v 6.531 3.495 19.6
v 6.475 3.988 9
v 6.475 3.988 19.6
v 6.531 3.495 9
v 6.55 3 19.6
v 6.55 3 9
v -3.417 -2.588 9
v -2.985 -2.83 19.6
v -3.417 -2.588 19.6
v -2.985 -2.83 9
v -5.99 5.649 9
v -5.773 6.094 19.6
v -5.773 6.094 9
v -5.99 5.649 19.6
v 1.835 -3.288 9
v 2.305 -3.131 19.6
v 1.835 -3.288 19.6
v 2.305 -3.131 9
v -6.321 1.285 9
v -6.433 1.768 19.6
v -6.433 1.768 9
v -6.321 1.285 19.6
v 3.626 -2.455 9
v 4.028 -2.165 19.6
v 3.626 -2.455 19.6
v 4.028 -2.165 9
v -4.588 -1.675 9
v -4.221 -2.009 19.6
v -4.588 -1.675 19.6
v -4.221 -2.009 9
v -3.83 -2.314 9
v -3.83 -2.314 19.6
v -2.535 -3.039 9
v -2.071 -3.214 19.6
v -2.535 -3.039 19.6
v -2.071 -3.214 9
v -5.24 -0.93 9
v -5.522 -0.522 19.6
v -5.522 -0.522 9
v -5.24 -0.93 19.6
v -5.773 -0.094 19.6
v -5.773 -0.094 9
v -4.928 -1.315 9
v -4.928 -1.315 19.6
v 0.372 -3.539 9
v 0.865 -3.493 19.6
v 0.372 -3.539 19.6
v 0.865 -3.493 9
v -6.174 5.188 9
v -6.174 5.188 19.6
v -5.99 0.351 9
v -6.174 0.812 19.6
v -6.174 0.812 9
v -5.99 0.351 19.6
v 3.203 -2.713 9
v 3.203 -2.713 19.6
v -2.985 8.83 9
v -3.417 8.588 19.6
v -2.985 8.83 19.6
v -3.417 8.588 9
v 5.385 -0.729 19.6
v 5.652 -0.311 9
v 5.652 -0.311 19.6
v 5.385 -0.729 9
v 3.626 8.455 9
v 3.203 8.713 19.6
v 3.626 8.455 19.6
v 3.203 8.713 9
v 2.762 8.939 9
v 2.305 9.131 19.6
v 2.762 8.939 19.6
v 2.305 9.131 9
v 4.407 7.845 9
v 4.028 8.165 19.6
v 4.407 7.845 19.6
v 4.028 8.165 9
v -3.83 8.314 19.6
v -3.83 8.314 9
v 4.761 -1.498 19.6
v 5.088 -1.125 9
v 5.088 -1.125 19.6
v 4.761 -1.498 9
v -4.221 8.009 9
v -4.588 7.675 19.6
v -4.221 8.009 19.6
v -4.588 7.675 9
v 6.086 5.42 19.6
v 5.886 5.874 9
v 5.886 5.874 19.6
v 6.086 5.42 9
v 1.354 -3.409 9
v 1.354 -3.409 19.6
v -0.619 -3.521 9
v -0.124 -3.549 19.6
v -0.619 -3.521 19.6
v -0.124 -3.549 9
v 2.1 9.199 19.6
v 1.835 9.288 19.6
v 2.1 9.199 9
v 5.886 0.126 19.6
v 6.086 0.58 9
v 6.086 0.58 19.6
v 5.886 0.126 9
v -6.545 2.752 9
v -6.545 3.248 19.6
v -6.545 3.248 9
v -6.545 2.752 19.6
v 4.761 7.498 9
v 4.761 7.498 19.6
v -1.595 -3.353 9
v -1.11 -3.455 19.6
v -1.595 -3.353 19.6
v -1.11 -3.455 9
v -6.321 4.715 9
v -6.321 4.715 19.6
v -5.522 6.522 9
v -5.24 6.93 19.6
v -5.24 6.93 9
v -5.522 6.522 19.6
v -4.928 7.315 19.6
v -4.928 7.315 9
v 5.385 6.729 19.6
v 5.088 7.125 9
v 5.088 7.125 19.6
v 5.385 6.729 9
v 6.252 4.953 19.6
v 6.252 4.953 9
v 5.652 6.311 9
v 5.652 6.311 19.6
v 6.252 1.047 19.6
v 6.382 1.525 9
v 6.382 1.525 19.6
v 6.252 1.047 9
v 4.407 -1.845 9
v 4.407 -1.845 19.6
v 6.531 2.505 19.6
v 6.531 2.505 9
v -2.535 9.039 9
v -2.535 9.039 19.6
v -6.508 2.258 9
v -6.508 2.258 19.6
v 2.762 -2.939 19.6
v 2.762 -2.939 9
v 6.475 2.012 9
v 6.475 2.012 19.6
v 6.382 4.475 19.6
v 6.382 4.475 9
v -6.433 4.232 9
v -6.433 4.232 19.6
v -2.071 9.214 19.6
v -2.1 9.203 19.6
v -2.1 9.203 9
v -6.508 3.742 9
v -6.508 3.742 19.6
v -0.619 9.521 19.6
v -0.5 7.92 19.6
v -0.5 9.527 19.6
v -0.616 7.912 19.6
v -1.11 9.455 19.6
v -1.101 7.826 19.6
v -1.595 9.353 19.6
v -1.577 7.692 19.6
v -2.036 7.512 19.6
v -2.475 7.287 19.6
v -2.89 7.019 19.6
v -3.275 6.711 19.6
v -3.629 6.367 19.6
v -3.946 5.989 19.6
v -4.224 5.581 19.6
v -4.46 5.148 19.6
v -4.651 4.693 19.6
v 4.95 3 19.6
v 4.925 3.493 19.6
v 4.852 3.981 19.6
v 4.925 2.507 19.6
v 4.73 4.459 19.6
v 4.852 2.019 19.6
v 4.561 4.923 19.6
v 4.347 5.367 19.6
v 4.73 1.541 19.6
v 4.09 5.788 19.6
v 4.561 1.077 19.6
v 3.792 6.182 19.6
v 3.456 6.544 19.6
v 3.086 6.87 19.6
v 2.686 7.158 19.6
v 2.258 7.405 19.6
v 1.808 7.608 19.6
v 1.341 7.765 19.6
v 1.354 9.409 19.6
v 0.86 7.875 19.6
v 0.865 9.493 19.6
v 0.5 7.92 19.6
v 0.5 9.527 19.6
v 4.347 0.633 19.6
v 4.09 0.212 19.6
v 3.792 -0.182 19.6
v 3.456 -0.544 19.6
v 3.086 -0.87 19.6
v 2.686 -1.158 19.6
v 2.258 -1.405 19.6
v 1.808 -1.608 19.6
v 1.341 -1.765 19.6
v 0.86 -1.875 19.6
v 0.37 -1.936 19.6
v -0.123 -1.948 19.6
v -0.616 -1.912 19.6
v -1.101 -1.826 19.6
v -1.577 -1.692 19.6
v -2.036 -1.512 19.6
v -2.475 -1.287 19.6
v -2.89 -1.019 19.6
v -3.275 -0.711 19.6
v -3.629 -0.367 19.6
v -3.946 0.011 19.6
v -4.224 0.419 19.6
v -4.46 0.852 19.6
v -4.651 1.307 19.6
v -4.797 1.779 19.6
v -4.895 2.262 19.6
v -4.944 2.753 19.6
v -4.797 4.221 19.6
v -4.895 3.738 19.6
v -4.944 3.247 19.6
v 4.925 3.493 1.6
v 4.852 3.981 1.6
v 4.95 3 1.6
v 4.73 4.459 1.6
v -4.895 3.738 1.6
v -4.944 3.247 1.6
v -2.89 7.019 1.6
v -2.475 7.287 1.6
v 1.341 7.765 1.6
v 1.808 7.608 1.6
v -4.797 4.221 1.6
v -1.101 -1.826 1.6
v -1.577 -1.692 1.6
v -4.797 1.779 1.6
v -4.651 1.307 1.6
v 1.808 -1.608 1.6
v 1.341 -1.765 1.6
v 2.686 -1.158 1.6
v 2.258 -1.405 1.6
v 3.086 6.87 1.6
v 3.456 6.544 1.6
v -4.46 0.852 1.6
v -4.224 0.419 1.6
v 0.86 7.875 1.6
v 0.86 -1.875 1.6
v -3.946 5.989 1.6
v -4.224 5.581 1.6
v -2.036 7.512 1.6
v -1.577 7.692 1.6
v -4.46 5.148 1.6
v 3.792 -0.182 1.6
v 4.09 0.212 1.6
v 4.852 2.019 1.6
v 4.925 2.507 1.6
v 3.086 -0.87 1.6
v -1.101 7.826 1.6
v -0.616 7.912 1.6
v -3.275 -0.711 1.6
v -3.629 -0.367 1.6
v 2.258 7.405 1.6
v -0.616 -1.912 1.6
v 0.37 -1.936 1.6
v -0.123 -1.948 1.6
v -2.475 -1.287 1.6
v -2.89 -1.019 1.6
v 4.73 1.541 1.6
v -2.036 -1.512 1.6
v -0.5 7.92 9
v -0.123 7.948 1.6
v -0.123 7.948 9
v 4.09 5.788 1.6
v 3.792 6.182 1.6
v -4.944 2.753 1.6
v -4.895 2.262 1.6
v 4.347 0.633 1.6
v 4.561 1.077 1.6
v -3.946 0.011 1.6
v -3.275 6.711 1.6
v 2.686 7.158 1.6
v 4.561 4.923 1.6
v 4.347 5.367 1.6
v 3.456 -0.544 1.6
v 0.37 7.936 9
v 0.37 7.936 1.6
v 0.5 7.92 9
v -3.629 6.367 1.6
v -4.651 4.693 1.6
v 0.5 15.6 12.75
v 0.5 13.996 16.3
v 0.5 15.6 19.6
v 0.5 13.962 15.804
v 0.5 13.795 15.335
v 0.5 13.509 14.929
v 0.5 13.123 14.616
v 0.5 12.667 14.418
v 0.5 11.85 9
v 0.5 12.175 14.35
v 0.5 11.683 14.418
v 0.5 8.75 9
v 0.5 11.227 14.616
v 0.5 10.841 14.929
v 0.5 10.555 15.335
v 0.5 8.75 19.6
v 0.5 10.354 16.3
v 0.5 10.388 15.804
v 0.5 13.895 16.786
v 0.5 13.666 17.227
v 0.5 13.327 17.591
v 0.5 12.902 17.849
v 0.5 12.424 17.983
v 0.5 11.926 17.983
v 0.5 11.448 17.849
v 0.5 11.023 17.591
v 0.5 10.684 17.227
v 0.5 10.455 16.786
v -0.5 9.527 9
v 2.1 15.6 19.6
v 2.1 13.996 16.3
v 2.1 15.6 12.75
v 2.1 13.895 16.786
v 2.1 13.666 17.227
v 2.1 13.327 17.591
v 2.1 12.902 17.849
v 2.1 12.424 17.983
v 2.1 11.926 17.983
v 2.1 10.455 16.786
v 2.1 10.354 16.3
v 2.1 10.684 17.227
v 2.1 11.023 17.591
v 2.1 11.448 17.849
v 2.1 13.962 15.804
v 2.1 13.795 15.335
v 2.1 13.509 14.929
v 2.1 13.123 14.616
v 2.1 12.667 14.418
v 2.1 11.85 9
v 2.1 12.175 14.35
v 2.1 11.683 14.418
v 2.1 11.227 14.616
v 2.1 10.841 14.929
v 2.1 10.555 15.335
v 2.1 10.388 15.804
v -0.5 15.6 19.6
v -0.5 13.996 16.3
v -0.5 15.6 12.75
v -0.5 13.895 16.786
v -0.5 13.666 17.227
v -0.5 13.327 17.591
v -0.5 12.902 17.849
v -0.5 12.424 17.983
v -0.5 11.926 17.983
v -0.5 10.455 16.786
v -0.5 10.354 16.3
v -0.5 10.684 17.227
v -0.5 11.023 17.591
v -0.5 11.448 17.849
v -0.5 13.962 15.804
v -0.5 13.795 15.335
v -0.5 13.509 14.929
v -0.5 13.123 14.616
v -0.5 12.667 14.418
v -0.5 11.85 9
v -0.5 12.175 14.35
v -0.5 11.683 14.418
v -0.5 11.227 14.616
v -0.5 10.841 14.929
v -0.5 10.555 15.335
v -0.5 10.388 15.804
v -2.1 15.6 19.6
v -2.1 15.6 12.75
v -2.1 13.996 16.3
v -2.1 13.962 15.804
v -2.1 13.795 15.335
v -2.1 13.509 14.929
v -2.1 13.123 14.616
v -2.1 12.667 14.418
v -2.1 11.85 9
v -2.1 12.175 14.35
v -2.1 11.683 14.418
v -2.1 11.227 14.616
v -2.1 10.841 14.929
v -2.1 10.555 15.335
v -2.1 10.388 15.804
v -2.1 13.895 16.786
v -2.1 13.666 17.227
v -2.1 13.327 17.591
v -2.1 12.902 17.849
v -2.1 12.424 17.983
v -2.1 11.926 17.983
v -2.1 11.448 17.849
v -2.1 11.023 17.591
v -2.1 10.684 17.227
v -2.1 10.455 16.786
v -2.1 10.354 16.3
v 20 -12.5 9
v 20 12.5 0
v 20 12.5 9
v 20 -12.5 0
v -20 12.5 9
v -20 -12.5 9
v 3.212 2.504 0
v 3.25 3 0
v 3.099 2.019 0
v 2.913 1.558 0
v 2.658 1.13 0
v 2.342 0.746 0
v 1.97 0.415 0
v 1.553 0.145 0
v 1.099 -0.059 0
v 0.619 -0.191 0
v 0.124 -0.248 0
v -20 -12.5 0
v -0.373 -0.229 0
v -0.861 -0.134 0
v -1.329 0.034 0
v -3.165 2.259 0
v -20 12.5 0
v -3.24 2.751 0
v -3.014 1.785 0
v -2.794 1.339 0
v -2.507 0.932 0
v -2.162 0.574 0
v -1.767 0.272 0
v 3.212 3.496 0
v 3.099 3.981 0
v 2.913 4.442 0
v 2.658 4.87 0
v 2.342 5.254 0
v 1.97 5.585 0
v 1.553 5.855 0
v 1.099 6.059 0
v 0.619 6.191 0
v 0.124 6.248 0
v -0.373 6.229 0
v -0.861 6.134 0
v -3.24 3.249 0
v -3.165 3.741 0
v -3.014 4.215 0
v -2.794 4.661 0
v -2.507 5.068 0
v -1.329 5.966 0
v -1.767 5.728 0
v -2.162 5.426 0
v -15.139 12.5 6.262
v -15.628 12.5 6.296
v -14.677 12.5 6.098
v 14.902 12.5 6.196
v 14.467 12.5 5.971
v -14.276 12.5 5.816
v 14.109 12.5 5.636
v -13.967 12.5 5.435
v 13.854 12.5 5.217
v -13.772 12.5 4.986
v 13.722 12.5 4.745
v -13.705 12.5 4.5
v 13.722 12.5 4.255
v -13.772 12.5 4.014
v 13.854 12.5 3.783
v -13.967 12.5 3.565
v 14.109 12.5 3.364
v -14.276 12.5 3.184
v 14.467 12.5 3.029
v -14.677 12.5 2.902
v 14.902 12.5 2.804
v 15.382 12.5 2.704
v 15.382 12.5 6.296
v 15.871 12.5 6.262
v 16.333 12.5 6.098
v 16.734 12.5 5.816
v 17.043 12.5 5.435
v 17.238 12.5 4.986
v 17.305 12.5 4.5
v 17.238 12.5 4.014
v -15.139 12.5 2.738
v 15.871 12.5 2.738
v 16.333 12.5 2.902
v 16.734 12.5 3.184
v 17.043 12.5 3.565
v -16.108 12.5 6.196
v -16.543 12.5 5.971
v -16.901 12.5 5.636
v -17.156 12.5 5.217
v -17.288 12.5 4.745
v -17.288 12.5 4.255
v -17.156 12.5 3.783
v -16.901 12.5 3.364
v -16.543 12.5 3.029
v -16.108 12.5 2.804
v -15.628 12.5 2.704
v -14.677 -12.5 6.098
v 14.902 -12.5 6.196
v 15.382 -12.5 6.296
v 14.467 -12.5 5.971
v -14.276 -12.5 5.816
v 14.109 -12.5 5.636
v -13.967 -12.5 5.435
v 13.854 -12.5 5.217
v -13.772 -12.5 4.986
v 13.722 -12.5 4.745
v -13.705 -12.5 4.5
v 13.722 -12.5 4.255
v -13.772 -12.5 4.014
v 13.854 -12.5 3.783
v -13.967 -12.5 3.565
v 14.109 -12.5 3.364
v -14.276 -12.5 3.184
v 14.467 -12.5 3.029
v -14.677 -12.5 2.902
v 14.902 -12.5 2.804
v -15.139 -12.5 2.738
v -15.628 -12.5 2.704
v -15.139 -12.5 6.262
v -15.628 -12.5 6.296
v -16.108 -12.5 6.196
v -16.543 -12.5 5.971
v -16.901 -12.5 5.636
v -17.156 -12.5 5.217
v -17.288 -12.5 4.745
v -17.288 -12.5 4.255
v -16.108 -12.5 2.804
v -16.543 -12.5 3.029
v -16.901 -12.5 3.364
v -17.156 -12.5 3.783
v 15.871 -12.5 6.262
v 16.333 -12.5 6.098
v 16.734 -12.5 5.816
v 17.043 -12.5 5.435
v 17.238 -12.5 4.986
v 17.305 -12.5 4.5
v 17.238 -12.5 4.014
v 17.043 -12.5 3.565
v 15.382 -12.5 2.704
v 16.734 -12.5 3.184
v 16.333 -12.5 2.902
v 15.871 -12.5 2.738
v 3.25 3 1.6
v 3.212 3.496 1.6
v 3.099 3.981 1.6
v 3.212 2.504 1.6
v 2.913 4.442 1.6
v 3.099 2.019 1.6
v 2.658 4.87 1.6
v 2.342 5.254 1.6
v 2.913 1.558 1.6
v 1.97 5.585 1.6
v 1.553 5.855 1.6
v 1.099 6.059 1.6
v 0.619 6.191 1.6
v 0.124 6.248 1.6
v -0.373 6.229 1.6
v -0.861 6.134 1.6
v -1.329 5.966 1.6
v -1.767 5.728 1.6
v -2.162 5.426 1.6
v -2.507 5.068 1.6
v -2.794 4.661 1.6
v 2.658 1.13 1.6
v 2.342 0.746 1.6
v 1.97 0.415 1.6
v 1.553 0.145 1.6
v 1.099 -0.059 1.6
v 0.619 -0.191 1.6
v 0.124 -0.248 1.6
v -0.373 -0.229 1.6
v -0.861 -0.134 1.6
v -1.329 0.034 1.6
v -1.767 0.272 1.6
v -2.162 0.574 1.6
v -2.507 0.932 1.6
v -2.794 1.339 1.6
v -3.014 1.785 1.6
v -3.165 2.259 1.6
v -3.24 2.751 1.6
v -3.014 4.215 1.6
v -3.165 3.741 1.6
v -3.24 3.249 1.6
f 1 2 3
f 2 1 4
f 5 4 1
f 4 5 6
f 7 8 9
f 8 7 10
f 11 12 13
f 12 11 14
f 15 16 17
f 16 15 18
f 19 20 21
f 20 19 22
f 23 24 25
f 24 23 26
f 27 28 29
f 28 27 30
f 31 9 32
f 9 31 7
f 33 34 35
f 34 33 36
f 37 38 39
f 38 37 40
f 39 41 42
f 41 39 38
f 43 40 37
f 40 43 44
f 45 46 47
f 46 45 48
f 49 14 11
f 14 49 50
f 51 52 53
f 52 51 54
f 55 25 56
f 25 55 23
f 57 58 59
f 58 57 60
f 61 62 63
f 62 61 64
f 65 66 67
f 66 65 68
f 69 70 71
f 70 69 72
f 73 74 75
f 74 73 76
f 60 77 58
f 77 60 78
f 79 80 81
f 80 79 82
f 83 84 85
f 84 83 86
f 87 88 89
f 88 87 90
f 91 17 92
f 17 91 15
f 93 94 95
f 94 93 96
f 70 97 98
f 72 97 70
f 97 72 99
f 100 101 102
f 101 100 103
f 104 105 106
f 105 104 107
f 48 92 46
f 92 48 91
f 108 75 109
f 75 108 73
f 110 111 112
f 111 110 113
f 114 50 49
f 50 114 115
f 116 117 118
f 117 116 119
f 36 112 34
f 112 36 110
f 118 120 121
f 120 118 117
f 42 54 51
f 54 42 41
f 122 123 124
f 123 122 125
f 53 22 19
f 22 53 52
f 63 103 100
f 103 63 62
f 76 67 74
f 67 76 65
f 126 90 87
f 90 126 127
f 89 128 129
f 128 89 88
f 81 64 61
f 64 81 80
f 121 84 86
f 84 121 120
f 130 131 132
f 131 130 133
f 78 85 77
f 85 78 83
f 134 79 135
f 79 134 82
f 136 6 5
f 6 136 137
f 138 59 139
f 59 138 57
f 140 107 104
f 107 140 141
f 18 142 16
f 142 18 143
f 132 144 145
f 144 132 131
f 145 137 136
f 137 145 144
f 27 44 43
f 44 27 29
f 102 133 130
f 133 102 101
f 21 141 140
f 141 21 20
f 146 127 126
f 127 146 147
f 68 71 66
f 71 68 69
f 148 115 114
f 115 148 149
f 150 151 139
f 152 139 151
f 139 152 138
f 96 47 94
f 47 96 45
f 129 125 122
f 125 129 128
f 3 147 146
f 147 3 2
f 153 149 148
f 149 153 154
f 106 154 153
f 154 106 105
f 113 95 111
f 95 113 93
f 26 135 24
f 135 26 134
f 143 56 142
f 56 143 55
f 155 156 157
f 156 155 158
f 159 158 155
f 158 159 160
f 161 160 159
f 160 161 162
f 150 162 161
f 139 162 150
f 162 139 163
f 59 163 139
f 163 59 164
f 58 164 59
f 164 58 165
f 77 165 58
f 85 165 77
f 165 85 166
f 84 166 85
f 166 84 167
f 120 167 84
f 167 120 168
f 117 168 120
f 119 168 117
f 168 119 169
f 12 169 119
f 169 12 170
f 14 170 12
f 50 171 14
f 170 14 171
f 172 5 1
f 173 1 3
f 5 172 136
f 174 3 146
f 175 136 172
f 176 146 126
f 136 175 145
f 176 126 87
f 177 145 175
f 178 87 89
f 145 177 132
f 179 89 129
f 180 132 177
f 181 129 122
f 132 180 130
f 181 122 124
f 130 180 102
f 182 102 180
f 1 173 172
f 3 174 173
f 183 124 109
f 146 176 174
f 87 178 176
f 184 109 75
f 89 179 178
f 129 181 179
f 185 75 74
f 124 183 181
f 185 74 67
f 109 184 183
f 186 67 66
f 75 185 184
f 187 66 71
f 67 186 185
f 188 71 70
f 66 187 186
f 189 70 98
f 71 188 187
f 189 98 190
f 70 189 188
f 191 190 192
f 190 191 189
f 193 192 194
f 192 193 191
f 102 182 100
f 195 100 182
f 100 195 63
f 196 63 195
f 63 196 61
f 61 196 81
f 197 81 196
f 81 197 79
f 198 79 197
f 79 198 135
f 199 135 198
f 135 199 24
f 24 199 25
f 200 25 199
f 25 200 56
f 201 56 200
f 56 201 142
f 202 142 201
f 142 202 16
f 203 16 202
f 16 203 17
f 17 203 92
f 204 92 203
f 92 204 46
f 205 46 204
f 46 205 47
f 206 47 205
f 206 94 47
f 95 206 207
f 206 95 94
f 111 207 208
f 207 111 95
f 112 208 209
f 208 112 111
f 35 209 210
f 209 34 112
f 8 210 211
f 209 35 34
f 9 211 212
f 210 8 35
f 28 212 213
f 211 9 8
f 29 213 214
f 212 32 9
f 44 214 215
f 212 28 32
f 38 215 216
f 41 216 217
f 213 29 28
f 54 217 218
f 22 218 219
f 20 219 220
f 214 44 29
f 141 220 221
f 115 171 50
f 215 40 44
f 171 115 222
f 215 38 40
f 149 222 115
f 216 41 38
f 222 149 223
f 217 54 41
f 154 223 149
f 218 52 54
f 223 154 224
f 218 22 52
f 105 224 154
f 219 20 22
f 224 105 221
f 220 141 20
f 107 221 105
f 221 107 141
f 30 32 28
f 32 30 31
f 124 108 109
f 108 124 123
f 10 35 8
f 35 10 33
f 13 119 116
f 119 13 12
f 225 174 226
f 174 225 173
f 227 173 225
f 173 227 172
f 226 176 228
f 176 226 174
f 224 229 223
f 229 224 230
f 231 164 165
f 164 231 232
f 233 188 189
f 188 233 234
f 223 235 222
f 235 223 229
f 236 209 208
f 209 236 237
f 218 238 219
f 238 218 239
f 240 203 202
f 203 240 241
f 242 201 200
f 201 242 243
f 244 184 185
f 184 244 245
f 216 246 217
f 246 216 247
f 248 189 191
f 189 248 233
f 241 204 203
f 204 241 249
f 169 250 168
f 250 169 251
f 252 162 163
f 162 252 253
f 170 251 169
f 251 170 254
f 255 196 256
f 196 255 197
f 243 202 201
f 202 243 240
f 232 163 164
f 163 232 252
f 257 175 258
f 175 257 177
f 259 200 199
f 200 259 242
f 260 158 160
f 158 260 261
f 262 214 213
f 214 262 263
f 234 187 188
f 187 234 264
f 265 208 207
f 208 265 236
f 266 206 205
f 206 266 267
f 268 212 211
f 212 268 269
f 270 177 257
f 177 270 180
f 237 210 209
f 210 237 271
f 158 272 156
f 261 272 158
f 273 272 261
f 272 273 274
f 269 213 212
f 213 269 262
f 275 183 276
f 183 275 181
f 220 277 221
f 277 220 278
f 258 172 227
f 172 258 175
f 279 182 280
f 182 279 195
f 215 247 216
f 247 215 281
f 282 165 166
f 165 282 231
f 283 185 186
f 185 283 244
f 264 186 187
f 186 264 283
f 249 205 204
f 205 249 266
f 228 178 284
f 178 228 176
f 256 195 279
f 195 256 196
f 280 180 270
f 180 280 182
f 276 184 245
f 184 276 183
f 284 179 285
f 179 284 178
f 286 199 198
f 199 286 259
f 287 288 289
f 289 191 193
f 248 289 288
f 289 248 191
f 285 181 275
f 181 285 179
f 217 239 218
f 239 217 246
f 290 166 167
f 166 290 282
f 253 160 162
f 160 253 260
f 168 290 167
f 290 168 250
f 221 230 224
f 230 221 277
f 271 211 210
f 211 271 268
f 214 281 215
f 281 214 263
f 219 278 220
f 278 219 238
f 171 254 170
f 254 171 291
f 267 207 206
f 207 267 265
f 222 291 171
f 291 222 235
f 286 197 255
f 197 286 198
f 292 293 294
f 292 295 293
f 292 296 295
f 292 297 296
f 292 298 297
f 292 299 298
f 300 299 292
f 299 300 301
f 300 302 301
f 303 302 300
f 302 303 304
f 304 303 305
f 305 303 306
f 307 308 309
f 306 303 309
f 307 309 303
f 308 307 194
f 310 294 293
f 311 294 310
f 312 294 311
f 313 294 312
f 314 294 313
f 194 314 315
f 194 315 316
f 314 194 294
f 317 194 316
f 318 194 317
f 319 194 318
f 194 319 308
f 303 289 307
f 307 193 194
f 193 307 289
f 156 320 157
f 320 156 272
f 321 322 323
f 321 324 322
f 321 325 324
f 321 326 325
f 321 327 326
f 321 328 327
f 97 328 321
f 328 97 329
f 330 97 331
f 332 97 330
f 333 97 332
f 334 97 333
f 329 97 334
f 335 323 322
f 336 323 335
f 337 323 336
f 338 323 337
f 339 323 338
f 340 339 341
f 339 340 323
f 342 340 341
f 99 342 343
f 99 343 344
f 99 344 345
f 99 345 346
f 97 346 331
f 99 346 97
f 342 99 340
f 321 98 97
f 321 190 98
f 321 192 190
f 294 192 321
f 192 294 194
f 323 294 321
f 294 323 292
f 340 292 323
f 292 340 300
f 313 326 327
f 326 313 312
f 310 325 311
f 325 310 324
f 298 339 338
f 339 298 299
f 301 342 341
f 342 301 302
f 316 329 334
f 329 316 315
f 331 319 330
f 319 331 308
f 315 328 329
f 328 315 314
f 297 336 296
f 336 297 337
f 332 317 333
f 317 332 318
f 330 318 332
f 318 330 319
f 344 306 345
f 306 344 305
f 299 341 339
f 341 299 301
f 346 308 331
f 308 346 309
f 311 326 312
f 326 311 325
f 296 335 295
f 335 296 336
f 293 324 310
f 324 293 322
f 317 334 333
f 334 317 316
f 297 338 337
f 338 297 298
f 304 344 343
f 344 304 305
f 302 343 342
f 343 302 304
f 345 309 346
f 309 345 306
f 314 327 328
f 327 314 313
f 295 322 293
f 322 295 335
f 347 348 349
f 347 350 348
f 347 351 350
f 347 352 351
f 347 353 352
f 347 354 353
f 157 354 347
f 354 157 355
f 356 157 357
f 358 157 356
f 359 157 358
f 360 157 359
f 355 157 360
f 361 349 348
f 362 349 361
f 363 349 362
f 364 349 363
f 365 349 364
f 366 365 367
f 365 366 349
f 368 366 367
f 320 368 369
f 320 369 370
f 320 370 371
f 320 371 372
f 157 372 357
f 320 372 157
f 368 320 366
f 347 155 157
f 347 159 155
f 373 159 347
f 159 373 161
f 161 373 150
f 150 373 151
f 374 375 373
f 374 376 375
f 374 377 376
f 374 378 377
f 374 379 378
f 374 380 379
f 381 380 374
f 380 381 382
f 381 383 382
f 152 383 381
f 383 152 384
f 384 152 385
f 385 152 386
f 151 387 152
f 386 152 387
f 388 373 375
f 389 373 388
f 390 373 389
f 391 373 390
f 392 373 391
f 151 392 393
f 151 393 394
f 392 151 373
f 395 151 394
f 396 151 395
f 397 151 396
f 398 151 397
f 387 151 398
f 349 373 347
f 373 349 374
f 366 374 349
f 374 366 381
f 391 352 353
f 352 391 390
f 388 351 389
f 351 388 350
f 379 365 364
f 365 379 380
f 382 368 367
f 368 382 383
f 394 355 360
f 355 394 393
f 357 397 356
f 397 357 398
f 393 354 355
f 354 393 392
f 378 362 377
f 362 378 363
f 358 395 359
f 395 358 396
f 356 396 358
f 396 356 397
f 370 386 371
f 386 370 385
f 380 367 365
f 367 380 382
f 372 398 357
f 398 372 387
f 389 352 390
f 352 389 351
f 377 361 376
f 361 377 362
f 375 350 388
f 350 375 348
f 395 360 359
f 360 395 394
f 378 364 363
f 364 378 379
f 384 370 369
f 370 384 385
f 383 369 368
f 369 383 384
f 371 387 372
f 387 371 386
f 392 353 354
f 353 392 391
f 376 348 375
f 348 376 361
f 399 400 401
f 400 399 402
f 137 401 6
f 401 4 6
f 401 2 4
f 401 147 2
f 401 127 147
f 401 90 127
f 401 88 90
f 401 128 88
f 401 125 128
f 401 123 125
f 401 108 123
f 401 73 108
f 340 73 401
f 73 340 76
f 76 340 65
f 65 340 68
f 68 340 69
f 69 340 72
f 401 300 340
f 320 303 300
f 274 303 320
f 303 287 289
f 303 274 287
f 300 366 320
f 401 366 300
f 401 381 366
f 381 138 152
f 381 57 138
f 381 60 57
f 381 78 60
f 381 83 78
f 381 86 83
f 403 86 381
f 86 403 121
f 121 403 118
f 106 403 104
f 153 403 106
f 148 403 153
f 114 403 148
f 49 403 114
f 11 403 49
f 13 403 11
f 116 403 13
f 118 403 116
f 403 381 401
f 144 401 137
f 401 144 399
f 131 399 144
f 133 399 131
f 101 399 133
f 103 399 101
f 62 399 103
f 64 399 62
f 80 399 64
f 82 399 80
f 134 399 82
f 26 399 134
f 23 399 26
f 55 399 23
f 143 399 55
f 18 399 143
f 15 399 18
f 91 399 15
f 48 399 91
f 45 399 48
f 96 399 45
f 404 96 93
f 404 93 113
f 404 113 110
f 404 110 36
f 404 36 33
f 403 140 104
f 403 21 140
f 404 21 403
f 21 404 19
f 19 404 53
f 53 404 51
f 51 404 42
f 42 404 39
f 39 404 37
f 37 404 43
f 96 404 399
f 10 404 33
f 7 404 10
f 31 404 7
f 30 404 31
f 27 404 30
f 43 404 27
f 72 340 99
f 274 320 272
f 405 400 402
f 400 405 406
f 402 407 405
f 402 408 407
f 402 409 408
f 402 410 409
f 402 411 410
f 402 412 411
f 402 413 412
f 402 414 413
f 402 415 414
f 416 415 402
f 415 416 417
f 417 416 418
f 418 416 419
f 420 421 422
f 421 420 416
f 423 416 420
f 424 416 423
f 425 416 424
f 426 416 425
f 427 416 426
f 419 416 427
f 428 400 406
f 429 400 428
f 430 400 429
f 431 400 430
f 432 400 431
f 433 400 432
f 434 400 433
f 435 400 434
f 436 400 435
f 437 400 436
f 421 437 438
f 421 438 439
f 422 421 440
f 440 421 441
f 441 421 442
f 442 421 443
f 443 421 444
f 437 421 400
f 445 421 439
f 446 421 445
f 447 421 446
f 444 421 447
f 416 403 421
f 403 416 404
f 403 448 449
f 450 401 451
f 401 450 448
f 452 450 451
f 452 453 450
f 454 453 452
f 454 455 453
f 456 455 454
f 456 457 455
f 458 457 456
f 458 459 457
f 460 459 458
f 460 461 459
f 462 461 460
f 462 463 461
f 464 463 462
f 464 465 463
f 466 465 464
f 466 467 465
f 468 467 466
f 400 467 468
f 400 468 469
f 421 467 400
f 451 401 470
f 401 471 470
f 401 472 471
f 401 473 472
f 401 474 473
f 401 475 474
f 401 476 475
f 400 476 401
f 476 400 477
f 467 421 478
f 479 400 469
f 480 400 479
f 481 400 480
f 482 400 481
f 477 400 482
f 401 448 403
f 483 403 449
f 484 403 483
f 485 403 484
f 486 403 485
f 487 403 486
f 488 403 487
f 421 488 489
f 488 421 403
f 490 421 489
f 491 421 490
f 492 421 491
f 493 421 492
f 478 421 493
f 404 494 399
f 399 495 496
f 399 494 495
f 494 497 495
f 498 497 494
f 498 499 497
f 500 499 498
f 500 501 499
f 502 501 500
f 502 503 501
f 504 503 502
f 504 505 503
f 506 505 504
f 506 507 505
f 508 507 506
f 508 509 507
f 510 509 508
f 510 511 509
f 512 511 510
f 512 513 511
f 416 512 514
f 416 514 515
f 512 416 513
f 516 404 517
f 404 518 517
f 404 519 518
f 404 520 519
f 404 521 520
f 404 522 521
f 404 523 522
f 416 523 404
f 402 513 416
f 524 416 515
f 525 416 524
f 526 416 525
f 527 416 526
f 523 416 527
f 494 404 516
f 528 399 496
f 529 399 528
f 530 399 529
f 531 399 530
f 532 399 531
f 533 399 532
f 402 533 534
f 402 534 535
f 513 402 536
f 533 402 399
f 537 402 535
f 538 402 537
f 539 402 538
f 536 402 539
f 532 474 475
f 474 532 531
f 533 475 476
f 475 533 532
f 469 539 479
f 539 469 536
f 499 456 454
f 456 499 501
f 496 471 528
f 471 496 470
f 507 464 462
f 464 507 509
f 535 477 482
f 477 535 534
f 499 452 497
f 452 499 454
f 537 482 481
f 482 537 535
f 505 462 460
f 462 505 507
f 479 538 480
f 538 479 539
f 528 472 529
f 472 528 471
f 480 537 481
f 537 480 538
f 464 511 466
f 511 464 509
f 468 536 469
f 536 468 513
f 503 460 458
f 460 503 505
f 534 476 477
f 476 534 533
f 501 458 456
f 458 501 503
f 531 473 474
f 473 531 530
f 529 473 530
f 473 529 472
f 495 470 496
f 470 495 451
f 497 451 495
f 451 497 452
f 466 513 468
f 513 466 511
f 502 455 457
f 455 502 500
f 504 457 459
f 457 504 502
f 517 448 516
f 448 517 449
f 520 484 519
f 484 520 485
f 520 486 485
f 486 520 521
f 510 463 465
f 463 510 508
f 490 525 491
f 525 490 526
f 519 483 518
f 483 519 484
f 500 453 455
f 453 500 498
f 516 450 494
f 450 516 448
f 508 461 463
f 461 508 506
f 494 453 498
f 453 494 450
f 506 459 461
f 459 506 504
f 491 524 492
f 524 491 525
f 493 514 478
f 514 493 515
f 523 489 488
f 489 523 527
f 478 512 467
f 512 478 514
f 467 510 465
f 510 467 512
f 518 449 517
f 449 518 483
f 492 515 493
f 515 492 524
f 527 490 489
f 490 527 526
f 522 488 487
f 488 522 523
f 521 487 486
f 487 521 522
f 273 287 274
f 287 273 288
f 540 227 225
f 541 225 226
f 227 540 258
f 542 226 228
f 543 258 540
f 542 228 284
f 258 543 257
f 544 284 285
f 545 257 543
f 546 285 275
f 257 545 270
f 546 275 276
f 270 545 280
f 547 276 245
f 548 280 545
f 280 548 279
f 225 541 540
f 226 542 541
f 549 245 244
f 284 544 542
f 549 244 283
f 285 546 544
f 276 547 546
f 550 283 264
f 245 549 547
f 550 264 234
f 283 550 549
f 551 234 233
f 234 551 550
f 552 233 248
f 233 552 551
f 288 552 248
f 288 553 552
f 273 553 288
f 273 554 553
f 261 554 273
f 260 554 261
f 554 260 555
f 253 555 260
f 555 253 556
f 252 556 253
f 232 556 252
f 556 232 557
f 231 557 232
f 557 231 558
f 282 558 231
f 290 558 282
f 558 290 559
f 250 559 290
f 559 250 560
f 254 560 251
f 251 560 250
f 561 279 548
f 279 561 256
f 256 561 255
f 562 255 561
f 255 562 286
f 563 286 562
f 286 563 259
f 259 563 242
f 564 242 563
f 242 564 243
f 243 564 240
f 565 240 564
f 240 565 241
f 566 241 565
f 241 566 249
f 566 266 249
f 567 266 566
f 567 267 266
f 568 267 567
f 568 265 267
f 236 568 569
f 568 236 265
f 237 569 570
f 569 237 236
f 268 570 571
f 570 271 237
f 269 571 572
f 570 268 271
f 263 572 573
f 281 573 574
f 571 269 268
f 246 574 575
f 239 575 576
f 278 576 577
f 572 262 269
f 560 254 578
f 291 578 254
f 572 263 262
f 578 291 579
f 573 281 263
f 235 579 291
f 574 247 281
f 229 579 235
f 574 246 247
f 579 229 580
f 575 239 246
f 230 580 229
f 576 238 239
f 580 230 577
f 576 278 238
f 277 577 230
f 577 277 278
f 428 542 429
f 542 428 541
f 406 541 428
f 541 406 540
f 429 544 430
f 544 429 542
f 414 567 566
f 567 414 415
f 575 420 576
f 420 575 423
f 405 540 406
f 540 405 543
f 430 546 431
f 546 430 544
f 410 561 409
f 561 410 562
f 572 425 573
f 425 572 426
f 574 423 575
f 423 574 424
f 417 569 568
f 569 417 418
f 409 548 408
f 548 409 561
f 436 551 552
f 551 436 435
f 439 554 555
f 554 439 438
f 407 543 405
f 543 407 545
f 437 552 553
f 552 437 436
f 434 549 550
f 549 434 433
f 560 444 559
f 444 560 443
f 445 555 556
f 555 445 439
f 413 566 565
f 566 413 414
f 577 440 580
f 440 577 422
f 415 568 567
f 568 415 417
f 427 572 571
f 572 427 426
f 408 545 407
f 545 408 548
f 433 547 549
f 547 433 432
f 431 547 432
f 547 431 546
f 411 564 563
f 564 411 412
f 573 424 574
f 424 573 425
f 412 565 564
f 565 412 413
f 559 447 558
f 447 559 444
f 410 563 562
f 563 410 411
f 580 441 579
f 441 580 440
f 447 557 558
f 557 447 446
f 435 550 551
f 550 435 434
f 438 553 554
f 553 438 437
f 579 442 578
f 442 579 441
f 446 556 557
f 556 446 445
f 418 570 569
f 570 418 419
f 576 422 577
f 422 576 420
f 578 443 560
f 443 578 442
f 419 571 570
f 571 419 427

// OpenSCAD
//design and code by emanresu (http://www.thingiverse.com/Emanresu)
//dial indicator mount for a makerbot step-struder mk7

use <./MCAD/3d_triangle.scad>

// preview[view:east, tilt:top]


//CUSTOMIZER VARIABLES

//diameter of the sensor arm of the dial indicator (mm)
indicator_sensor_diameter=6.5;
//diameter of the mounting shaft of the dial indicator (mm)
indicator_mount_diameter = 9.9;
//length of the mounting shaft of the dial indicator (mm)
mount_depth = 18;
//diameter of clamping bolt (mm)
bolt_diameter=3.65;
//width of mounting block (mm)
block_width = 25; 
//offset of clamp along the center of the mounting block (mm)
offset = 3;  


/* [Hidden] */

//sets openSCAD resolution
$fa=1;
$fs=0.5;

//Clamp parameters
thick = 1.6;//thickness of clamp, bottom of clamp
gap = 1;//gap between tightening tabs on clamp

indicator_sensor_radius=indicator_sensor_diameter/2; //radius of the dial indicator's sensor shaft
indicator_mount_radius = indicator_mount_diameter/2;//radius of dial indicator's mounting shaft

//mounting block dimentions
//y dimention controled by block_with above
bm_x = 40; //width of stepstruder bar mount
bm_z = 9; //thickness of stepstruder bar mount

//mounting block holes (to line up with the stepstruder bar mount)
bm_hole_offset = 31.01/2; //how far the holes are from the center of the mounting block NEMA 17
bm_hole_diameter = 3.6;  //M3 bolt clearance hole diameter
bm_hole_radius = bm_hole_diameter/2;  //M3 bolt clearance hole radius

bolt_radius=bolt_diameter/2;//radius of tightening bolt


  /////////////
 // Modules //
/////////////

module DI_clamp() {
	//generates the dial indicator clamp, puts everything together
	union() {
		translate([0, offset, thick]) {
			clamp_cyl();
		}
		translate([0, 0, bm_z/2]) {
			difference() {
				mounting_block();
				translate([0, offset, thick]) {
					cylinder(r=indicator_mount_radius, h=bm_z, center=true);
				}
				translate([0, offset, 0]) {
					cylinder(r=indicator_sensor_radius, h=bm_z+1, center=true);
				}
			}	
		}	
	}
}

module mounting_block() {
	// generates the mounting block with holes to mount to a mk7 stepstruder
	difference() {
		cube(size=[bm_x, block_width, bm_z], center=true);
		translate([bm_hole_offset, 0, 0]) {
			rotate([90, 0, 0]) {
				cylinder(r=bm_hole_radius, h=block_width+1, center=true);
			}
		}
		translate([-bm_hole_offset, 0, 0]) {
			rotate([90, 0, 0]) {
				cylinder(r=bm_hole_radius, h=block_width+1, center=true);
			}
		}
	}
}

module clamp_cyl() {
	//makes a cylindric clamp with screw tabs to tighten it
	//radius determines the internal radius
	//depth determines the height
	//thick determines how thick it is, difference between external and internal radius
	//gap determines how large the gap in the clamp is
	union() {
		difference() {
			cylinder(r=indicator_mount_radius+thick, h=mount_depth, center=false);
			translate([0, 0, -0.5]) {
				cylinder(r=indicator_mount_radius, h=mount_depth+1, center=false);
			}
			translate([-gap/2, 0, -0.5]) {
				cube(size=[gap, indicator_mount_radius+thick, mount_depth+1], center=false);
			}
		}
		translate([gap/2, indicator_mount_radius+thick/2, mount_depth-(2*bolt_radius+2*thick)]) {
			screw_tab();
		}

		translate([-gap/2-thick, indicator_mount_radius+thick/2, mount_depth-(2*bolt_radius+2*thick)]) {
			screw_tab();
		}	
	}	
}

module screw_tab() {
	//makes the screw tabs on the clamp
	//square tabs with triangular bottoms
	//rad determines the radius of the screw holes
	//thick determines how thick the tabs are
	difference() {
		union() {
			cube(size=[thick, 2*bolt_radius+2*thick, 2*bolt_radius+2*thick], center=false);
			rotate([0, 90, 0]) {
				3dtri_draw([0,0,0],[0,2*bolt_radius+2*thick,0],[2*bolt_radius+2*thick,0,0],thick);
			}
		}
		translate([-0.5, (2*bolt_radius+2*thick)/2, (2*bolt_radius+2*thick)/2]) {
			rotate([0, 90, 0]) {
				cylinder(r=bolt_radius, h=thick+1, center=false);
			}
		}
	}	
}


  //////////////////
 // Control Code //
//////////////////

DI_clamp();
